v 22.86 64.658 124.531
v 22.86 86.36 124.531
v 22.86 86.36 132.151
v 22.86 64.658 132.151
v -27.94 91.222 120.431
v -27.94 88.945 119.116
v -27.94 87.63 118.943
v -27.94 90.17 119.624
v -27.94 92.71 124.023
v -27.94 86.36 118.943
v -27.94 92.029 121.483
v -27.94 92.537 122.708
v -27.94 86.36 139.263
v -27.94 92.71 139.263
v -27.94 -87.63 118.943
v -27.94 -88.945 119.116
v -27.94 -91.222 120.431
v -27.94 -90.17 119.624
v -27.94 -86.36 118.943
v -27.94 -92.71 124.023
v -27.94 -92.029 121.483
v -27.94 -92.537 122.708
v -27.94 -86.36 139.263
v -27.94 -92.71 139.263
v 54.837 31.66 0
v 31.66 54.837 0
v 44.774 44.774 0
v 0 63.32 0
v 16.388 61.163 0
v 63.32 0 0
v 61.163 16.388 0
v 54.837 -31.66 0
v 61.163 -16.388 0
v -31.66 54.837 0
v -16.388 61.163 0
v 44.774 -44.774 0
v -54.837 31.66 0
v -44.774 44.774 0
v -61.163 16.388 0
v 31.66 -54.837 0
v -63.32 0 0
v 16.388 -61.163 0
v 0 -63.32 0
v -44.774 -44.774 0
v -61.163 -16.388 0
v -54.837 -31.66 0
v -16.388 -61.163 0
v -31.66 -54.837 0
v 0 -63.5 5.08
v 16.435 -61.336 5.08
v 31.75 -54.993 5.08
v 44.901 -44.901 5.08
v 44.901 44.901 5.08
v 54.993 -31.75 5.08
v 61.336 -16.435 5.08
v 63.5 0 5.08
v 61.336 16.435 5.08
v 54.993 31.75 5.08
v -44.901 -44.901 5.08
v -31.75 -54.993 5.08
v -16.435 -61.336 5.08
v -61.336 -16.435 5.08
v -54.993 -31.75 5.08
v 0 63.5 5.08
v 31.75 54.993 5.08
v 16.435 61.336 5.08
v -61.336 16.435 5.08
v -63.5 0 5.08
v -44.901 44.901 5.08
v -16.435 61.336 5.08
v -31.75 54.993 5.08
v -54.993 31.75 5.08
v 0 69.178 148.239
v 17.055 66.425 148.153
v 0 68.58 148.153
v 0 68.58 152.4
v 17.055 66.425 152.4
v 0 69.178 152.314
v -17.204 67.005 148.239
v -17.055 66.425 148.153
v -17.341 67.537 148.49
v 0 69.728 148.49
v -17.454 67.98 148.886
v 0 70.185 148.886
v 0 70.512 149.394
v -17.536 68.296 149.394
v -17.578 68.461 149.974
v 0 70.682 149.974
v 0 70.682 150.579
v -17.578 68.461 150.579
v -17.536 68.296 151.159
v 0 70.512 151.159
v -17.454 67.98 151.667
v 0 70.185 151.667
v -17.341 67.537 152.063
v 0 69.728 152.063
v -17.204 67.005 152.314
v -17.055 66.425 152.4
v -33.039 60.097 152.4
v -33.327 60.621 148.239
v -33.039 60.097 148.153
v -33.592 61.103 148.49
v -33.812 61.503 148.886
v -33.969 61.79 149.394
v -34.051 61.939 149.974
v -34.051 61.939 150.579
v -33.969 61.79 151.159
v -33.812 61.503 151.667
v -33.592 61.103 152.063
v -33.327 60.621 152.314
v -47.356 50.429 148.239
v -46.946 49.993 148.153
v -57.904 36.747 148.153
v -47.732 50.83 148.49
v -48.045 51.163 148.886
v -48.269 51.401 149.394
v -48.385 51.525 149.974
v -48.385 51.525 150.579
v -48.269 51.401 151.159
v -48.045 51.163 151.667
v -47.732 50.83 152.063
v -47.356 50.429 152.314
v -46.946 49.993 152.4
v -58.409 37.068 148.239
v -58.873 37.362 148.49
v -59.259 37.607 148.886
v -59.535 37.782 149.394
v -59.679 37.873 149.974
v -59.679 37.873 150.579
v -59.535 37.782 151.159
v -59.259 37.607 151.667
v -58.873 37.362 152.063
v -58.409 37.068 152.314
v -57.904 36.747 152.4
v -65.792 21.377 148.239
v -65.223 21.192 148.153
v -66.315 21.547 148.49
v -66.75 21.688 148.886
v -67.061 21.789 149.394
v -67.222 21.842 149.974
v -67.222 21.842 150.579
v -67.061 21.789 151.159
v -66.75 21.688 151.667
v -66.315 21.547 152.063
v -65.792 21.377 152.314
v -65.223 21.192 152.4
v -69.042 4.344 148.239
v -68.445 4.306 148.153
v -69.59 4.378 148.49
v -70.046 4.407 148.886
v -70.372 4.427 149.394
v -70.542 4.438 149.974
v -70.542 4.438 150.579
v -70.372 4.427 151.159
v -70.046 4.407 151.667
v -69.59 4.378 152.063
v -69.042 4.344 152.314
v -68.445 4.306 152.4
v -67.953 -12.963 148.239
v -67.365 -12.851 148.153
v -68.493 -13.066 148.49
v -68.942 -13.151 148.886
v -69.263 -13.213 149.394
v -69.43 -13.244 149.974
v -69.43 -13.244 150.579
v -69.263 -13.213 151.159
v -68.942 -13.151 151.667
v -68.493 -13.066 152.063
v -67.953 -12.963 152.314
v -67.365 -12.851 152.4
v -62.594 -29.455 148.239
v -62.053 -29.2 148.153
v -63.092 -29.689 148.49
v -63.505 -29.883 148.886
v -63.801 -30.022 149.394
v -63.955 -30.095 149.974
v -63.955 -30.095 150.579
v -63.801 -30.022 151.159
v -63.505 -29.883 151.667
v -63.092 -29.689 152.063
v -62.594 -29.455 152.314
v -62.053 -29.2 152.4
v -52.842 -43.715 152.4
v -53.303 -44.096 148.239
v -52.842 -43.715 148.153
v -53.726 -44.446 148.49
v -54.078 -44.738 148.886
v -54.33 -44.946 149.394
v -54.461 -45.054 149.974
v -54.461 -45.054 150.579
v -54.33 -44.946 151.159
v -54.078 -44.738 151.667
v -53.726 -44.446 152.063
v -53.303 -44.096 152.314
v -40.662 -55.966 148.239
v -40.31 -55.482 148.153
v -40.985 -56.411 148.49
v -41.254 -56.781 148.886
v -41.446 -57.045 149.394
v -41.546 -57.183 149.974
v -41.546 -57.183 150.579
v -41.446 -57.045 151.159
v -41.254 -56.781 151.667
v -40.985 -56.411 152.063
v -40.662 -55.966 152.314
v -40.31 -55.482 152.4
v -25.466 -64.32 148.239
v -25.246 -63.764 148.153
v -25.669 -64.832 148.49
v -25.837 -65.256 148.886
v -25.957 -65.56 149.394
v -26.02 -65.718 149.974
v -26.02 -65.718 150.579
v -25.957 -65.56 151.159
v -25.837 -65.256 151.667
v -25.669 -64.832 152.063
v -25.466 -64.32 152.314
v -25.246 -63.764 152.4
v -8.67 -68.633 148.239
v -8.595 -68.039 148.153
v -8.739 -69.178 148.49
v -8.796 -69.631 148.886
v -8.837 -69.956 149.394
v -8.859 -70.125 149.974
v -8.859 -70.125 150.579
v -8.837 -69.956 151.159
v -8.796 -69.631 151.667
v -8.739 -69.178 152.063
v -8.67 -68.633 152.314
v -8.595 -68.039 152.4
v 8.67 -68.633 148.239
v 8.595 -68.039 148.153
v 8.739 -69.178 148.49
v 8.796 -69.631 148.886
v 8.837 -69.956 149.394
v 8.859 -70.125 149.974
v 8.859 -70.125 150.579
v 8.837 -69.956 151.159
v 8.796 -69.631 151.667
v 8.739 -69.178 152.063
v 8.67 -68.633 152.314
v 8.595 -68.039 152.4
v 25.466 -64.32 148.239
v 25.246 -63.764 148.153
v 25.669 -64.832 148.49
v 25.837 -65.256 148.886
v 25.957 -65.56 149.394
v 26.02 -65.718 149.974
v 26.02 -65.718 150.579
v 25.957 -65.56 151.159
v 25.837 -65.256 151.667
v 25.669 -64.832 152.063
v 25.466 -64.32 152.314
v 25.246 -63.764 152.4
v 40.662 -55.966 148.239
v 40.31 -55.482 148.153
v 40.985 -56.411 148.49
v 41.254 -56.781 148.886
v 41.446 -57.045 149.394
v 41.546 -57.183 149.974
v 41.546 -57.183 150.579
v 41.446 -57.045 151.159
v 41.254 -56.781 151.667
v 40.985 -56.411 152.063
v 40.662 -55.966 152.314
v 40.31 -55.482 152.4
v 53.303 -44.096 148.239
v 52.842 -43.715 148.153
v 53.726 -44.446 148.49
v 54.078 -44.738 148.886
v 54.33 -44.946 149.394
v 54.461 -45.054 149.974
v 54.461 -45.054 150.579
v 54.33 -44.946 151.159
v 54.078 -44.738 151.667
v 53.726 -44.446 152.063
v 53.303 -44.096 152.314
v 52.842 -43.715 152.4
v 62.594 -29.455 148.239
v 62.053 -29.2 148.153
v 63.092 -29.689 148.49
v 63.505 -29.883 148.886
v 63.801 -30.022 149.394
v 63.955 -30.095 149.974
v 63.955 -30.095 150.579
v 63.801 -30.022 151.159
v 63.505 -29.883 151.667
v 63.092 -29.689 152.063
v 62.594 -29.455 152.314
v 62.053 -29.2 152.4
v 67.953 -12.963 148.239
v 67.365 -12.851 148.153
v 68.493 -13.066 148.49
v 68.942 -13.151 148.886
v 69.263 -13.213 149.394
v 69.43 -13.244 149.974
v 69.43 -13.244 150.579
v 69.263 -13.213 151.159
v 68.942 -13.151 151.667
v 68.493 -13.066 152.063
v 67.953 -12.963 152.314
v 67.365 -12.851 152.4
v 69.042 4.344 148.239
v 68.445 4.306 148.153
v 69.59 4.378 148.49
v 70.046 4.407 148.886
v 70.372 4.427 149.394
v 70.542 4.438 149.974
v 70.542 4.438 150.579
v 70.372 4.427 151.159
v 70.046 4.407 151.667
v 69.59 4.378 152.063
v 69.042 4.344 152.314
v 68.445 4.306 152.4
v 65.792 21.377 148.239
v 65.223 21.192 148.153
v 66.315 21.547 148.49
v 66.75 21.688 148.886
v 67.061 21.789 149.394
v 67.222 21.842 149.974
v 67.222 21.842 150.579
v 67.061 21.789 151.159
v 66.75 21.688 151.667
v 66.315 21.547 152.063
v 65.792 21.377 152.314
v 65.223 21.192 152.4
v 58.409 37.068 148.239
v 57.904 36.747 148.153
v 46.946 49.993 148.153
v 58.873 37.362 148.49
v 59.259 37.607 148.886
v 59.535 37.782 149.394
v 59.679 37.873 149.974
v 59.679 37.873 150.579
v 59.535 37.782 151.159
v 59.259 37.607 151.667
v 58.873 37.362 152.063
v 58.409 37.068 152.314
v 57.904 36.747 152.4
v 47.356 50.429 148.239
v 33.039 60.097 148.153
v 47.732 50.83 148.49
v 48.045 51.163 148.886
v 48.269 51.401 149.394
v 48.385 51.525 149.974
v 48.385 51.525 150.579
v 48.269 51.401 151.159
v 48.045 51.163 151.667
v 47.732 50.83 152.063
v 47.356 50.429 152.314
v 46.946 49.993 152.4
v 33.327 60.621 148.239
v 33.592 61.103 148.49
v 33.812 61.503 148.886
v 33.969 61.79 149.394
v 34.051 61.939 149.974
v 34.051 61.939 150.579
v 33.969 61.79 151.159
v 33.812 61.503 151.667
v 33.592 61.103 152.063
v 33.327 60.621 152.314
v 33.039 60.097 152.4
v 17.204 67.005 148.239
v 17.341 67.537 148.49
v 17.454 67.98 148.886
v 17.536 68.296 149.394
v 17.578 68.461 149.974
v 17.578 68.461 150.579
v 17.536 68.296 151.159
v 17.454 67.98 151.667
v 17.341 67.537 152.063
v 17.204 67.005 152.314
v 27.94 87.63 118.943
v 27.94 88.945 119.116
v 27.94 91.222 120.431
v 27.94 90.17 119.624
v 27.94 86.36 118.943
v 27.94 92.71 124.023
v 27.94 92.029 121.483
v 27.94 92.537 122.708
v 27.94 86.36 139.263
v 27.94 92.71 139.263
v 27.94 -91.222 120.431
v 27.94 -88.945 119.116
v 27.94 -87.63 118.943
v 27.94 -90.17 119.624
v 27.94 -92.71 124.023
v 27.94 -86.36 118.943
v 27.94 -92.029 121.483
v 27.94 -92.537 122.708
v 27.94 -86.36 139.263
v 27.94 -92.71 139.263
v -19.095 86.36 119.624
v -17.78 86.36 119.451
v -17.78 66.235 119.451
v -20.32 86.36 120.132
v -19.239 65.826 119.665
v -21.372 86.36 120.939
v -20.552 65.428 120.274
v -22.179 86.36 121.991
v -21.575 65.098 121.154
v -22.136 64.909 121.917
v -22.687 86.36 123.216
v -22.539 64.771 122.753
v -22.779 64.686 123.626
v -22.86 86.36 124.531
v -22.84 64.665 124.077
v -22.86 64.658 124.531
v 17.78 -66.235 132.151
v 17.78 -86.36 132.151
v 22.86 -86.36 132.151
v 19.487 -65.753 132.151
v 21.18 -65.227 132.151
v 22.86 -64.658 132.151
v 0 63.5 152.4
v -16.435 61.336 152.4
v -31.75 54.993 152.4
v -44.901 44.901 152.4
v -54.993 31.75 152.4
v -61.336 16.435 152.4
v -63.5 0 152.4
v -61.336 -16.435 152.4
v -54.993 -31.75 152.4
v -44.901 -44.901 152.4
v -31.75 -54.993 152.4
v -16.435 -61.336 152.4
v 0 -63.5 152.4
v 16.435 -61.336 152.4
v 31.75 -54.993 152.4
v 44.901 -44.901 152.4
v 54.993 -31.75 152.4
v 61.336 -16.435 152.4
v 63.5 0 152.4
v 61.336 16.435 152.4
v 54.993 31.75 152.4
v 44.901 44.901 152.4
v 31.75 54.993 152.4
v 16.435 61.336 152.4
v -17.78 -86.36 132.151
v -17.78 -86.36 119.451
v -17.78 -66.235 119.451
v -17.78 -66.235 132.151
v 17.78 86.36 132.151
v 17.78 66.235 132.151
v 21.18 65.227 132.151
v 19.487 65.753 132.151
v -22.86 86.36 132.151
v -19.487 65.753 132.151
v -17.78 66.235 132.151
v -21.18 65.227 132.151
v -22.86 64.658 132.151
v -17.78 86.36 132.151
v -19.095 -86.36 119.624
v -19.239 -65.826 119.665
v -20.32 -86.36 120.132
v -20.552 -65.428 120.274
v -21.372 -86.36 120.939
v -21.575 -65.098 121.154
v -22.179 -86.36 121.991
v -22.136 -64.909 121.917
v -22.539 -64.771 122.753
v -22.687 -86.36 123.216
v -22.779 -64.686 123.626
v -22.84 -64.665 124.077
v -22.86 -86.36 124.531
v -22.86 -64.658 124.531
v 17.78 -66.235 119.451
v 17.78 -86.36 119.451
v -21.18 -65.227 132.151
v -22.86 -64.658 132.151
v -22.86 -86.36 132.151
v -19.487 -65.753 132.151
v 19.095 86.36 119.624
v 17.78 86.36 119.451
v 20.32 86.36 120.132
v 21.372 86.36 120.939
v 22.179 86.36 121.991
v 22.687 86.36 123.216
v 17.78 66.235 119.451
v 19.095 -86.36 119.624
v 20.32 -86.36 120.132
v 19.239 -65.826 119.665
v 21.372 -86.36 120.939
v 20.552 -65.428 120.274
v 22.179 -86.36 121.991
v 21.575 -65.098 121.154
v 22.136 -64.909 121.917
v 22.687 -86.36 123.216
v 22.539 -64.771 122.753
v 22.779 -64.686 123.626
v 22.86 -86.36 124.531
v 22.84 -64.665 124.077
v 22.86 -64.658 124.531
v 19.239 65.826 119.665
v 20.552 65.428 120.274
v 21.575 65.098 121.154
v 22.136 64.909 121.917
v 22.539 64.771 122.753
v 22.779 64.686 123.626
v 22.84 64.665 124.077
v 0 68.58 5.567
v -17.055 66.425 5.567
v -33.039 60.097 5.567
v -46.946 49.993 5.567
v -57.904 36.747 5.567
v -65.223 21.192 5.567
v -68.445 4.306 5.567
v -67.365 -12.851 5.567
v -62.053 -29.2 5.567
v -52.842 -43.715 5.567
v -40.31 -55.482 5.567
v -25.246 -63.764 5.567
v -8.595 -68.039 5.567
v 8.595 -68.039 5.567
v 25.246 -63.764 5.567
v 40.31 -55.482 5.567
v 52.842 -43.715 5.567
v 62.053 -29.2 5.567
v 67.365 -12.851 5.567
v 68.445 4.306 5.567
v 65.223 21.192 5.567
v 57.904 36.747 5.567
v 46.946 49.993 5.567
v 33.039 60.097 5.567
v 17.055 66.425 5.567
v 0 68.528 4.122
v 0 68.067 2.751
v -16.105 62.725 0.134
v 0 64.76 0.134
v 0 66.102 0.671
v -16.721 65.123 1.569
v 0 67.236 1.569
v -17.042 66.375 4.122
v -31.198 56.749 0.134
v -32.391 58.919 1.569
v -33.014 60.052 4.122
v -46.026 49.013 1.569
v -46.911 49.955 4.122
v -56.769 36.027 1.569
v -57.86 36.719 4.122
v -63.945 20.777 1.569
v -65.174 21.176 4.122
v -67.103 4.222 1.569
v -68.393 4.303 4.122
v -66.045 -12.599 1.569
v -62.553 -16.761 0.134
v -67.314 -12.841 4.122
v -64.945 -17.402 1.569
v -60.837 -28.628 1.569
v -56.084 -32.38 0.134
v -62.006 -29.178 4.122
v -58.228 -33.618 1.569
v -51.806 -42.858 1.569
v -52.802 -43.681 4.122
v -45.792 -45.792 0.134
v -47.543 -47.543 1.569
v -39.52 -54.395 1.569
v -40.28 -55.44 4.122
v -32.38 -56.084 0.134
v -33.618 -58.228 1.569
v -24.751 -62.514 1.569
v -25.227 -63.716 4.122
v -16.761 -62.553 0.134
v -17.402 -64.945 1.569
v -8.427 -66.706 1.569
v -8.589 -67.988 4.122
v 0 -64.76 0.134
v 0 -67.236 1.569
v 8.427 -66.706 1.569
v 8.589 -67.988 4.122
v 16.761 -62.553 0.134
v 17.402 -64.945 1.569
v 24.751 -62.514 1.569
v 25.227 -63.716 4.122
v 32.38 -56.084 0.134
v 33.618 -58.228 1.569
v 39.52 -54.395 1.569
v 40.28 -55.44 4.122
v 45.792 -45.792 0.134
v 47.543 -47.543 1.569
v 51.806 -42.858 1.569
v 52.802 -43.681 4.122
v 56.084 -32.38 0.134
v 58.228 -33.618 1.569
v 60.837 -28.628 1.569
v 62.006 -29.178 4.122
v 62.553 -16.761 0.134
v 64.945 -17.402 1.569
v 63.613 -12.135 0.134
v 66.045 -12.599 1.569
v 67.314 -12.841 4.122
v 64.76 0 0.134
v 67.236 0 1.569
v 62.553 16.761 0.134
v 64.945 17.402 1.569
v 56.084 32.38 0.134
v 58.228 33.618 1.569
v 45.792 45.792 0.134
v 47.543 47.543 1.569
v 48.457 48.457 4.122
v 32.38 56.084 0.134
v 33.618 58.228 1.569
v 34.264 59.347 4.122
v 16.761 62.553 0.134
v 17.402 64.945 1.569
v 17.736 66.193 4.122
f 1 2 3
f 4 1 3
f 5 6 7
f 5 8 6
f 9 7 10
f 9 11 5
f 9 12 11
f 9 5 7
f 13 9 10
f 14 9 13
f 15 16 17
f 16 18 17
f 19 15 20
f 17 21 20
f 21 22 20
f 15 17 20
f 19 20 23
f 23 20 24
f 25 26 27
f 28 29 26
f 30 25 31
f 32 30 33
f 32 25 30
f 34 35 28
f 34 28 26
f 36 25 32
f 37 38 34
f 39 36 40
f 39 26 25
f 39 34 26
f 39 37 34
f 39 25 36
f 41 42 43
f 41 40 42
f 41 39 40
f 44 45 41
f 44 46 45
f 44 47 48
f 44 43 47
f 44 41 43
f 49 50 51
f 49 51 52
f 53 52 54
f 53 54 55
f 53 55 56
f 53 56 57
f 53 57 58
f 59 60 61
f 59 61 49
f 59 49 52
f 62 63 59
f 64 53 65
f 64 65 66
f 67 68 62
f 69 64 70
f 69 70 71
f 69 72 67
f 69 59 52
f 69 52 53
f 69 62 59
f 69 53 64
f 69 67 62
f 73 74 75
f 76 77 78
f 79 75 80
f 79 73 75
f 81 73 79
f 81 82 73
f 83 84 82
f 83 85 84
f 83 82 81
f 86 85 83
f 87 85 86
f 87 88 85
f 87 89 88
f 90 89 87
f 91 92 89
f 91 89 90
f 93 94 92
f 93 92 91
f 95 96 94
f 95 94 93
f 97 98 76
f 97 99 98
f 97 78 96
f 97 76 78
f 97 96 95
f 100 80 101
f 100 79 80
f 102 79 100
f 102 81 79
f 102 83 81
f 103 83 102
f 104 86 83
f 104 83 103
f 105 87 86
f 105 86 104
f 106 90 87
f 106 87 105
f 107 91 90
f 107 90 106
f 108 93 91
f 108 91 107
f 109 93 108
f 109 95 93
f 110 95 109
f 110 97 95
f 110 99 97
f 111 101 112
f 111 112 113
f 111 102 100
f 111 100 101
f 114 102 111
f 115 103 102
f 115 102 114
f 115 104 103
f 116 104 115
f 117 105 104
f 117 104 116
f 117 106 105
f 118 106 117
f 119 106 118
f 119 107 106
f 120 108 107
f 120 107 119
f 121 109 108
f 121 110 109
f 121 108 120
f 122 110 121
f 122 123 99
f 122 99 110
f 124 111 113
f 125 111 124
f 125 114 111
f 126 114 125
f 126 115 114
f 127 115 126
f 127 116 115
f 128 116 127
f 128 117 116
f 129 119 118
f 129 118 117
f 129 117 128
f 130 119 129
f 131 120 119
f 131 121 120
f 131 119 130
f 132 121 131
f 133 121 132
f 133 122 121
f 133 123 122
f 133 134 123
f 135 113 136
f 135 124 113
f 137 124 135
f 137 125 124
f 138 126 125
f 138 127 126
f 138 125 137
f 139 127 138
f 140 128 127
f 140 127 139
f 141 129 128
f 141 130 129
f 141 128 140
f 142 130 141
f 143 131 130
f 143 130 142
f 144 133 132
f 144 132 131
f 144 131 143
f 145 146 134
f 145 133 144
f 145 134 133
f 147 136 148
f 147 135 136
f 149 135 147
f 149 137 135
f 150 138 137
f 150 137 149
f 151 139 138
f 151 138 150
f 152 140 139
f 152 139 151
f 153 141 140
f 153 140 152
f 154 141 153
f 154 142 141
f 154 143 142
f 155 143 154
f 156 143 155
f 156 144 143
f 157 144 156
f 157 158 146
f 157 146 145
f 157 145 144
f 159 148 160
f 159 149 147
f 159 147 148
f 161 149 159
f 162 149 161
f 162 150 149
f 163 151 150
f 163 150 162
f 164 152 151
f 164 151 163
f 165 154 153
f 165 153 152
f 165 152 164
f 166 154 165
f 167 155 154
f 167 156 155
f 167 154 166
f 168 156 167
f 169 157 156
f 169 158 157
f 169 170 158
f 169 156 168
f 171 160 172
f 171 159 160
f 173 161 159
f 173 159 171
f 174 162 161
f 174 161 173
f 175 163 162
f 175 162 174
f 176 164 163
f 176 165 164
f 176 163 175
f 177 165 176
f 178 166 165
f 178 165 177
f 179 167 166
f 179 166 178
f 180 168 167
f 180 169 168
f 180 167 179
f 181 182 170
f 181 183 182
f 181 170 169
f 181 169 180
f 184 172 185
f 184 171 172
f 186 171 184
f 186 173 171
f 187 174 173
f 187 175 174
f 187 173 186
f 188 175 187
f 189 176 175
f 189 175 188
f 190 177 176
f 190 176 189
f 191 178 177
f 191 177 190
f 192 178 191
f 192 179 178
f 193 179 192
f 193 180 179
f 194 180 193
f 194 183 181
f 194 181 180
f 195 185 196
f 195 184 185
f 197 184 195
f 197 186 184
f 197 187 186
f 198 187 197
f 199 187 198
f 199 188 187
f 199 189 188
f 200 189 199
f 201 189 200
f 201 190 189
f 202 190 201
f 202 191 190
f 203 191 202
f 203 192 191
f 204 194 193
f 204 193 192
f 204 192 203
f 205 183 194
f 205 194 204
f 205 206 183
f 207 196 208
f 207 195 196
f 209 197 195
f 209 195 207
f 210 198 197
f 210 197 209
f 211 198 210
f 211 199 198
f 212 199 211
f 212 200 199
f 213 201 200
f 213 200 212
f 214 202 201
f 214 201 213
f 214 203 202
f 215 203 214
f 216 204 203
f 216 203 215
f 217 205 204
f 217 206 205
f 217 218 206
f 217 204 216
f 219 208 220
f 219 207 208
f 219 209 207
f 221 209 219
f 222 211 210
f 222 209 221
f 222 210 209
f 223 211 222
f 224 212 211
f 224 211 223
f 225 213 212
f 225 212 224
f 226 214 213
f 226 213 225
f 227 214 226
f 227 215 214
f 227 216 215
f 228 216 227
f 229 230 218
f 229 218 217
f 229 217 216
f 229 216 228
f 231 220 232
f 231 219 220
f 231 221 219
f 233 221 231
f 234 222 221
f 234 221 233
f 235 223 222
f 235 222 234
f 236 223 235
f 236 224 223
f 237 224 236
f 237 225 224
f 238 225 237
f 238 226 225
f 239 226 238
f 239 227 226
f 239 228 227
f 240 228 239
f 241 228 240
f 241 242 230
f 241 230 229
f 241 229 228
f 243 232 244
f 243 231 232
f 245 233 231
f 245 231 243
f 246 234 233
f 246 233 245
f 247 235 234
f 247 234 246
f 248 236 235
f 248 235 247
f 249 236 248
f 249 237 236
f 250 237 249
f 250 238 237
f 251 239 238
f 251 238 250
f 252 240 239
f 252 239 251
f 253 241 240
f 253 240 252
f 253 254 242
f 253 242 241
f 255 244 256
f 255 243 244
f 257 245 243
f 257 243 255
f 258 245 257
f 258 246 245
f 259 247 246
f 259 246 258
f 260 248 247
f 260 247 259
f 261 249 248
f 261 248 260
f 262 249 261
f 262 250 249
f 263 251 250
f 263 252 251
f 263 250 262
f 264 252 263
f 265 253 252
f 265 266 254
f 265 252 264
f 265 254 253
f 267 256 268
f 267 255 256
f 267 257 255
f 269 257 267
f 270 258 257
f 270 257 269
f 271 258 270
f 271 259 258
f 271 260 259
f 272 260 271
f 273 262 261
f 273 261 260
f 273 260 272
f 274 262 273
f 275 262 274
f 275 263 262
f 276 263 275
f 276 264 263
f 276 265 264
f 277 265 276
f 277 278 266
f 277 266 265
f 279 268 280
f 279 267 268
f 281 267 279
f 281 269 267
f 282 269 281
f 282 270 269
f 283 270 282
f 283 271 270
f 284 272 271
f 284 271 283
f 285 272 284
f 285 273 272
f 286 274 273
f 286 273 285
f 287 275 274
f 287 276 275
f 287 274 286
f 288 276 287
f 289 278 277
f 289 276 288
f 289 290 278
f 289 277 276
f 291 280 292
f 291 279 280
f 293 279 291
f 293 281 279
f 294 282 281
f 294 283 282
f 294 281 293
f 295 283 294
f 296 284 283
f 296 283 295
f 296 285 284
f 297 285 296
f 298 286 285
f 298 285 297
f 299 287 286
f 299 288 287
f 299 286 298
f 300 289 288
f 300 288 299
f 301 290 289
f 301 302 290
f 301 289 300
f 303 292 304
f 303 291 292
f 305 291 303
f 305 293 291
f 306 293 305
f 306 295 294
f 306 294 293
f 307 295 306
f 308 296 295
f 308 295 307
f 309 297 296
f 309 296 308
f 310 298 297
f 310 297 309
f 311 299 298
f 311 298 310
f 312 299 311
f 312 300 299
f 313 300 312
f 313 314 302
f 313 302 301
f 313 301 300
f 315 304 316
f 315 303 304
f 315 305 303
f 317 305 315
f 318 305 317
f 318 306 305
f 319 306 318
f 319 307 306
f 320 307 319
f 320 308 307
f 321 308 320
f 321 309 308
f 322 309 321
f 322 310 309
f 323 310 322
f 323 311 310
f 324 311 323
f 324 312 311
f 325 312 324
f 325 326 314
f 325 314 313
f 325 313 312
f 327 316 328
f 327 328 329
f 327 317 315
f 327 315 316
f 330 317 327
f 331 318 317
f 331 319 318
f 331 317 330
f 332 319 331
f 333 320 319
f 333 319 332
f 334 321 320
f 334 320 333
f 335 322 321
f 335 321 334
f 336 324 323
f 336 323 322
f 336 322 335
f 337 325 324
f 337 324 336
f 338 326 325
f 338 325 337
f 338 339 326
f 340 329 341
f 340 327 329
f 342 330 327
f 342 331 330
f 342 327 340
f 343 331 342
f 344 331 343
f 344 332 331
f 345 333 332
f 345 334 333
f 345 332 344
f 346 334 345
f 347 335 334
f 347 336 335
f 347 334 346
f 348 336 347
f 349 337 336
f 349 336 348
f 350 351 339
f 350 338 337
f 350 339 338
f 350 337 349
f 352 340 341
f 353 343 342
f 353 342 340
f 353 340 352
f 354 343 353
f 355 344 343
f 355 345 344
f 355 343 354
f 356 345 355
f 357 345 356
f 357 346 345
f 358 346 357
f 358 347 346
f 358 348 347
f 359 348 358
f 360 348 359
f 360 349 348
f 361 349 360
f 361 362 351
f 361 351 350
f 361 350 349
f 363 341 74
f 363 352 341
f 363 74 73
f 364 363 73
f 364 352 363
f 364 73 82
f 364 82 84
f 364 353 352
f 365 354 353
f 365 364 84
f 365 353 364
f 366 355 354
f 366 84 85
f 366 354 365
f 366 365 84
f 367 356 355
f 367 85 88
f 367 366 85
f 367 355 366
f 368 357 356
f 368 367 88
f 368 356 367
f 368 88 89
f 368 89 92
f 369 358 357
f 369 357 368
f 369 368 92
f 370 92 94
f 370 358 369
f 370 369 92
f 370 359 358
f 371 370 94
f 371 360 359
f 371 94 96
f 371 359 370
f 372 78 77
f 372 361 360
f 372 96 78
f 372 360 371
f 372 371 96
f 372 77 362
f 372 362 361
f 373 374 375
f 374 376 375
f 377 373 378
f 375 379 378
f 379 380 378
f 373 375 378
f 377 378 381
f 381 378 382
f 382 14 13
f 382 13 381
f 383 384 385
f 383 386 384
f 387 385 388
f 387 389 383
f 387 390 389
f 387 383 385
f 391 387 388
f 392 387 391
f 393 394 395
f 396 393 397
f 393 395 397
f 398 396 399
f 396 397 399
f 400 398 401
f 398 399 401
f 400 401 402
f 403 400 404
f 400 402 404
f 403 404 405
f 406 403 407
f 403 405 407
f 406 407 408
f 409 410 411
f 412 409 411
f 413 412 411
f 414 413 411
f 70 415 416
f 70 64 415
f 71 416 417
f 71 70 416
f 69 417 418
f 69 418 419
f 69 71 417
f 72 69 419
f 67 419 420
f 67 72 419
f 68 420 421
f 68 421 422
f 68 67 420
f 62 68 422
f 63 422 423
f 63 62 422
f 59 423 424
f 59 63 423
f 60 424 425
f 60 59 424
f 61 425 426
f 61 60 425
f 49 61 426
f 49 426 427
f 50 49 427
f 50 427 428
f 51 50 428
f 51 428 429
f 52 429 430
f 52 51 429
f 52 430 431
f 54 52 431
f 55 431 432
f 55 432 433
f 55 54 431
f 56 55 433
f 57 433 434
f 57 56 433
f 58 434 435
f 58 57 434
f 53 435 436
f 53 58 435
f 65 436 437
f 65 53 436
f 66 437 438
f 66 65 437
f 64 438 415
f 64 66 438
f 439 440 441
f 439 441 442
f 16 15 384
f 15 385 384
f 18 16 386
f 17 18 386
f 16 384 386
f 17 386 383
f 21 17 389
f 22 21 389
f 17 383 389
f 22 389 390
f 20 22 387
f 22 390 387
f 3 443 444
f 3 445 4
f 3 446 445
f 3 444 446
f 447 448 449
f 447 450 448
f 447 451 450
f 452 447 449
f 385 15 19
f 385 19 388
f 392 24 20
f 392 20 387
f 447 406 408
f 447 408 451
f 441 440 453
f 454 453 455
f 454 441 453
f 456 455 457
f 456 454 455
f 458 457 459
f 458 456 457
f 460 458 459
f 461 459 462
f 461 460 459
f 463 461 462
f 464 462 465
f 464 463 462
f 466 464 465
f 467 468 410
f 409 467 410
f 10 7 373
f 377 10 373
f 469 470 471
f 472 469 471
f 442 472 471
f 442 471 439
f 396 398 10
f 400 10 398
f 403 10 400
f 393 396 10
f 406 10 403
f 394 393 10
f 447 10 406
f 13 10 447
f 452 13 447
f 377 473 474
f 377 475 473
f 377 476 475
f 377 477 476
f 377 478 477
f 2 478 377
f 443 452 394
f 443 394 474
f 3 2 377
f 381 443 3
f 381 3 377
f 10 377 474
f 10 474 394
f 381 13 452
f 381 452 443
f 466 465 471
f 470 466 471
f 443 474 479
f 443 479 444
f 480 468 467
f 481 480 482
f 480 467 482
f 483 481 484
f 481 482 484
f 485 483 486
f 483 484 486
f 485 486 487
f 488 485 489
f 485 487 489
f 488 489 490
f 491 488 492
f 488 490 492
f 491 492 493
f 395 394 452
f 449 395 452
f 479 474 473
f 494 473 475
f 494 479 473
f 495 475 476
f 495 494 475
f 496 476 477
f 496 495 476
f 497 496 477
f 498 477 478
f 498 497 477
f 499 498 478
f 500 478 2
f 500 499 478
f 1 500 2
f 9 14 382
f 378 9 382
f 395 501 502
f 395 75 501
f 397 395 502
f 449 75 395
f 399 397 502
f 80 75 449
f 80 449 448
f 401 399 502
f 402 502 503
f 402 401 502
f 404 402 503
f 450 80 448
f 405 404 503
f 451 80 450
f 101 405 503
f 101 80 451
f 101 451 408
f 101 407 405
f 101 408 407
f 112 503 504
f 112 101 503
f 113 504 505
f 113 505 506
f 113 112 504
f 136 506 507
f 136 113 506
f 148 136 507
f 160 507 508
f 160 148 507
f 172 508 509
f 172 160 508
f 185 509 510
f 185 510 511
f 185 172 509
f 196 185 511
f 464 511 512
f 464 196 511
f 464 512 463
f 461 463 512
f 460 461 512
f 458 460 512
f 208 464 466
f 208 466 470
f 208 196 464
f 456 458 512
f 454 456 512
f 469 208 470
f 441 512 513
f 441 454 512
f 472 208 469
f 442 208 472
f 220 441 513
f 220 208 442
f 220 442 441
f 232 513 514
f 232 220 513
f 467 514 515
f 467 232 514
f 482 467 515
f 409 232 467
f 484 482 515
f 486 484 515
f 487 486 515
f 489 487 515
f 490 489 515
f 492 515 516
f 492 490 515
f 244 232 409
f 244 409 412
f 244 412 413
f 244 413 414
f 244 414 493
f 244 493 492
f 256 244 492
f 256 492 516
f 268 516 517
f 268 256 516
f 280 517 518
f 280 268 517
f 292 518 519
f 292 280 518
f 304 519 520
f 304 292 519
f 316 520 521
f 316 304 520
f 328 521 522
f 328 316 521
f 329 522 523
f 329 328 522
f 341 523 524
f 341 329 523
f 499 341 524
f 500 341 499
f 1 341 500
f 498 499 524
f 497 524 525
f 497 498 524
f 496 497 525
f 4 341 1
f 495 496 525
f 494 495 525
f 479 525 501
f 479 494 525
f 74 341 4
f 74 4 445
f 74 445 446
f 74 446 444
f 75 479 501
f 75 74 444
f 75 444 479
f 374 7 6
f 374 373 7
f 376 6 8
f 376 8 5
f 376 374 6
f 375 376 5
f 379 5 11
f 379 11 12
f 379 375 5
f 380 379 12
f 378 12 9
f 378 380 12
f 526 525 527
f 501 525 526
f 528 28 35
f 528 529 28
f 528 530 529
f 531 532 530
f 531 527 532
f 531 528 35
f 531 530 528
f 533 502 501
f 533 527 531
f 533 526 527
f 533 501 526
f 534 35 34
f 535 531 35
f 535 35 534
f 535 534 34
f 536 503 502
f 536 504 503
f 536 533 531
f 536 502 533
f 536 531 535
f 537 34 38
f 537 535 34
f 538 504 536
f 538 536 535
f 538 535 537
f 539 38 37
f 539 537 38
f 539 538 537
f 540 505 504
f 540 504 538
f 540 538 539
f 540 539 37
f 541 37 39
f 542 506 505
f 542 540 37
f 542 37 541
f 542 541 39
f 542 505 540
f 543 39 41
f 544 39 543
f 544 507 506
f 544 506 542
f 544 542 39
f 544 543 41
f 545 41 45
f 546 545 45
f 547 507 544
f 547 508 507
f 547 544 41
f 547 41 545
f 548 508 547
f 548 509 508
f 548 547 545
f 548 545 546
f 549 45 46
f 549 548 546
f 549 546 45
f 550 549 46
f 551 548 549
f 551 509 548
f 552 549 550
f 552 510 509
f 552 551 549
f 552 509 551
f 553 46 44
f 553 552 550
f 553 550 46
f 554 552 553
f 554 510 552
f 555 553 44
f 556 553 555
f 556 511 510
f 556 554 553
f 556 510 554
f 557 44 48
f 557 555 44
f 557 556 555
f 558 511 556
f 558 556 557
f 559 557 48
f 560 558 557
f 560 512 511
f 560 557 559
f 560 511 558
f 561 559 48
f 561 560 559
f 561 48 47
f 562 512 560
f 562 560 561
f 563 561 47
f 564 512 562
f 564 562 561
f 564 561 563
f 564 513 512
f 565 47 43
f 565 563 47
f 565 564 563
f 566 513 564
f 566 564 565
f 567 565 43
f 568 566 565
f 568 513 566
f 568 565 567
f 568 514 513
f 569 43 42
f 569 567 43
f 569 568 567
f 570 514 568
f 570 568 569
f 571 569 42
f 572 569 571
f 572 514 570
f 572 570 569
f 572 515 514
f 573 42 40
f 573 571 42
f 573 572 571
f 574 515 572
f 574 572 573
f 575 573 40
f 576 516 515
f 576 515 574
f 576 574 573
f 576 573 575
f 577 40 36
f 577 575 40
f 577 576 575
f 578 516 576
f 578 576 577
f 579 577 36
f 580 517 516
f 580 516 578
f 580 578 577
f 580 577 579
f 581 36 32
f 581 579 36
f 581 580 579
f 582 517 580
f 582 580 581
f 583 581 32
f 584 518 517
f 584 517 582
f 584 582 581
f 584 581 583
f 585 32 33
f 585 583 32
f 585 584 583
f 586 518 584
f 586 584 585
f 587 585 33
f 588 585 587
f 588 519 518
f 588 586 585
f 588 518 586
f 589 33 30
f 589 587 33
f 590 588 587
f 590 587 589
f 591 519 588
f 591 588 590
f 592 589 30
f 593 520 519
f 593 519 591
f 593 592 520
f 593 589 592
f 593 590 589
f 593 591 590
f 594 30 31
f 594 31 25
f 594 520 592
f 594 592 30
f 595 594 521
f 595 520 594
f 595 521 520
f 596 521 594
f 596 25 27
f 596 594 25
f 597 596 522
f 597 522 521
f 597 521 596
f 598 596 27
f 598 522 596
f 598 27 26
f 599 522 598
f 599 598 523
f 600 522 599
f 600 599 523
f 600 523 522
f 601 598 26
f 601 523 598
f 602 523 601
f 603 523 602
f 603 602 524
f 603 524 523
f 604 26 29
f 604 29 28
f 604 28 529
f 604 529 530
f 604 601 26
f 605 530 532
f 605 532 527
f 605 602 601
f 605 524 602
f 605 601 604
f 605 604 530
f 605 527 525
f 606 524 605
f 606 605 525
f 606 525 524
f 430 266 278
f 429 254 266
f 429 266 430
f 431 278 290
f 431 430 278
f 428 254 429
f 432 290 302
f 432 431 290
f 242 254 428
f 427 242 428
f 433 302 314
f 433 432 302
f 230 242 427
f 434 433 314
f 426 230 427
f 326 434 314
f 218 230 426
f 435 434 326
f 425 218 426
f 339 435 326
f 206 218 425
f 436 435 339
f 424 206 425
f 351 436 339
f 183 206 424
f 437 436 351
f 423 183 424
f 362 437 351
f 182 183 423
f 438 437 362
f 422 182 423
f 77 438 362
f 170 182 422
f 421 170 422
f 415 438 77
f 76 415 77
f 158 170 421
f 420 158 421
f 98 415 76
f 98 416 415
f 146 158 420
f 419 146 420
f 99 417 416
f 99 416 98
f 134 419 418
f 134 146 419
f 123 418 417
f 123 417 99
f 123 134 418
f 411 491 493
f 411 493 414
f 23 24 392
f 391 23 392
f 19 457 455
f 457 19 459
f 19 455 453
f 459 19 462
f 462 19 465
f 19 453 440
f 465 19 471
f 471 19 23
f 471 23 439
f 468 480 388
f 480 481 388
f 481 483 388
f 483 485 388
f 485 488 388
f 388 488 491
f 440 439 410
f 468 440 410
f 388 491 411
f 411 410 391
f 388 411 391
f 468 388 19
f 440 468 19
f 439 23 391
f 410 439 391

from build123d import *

# Parameters (mm, degrees)
F3_W      = 5.08
F3_H      = 12.7
F6_W      = 55.88
F6_H      = 20.32
F7_DEPTH  = 6.35
F10_W     = 5.08
F10_H     = 12.7
F12_W     = 55.88
F12_H     = 20.32
F13_DEPTH = 6.35
F14_R     = 5.08
F15_R     = 5.08
F16_R     = 5.07999


# Not quite as in the source:
# - a fillet or chamfer is up to 0.001 mm smaller than in the source, because OpenCascade refuses the exact size


with BuildPart() as f1:
    # F0 (on Right) → F1 (revolve)
    with BuildSketch(Plane.YZ):
        with BuildLine():
            Line((63.5, 5.08), (0, 5.08))
            Line((0, 5.08), (0, 0))
            Line((0, 0), (63.3201003075, 0))
            ThreePointArc((63.3201003075, 0), (67.2357467781, 1.5686265864), (68.58, 5.5668586865))
            Line((68.58, 5.5668586865), (68.58, 148.1529325247))
            ThreePointArc((68.58, 148.1529325247), (70.7035337377, 150.2764662623), (68.58, 152.4))
            Line((68.58, 152.4), (63.5, 152.4))
            Line((63.5, 152.4), (63.5, 5.08))
        make_face()
    revolve(axis=Axis((0, 0, 2.54), (0, 0, 1)))

    # F3 (on offset) → F4 (join, up to the next surface of F1)
    with BuildSketch(Plane.XZ.offset(86.36)):
        with Locations((-20.32, 125.8009325247)):
            Rectangle(F3_W, F3_H)
        with Locations((20.32, 125.8009325247)):
            Rectangle(F3_W, F3_H)
    extrude(until=Until.NEXT, dir=(0, 1, 0))

    # F6 (on offset) → F7 (join, through all)
    with BuildSketch(Plane.XZ.offset(92.71)):
        with Locations((0, 129.1029325247)):
            Rectangle(F6_W, F6_H)
    extrude(amount=-F7_DEPTH)

    # F10 (on offset) → F11 (join, up to the next surface of F1)
    with BuildSketch(Plane.XZ.offset(-86.36)):
        with Locations((20.32, 125.8009325247)):
            Rectangle(F10_W, F10_H)
        with Locations((-20.32, 125.8009325247)):
            Rectangle(F10_W, F10_H)
    extrude(until=Until.NEXT)

    # F12 (on offset) → F13 (join, through all)
    with BuildSketch(Plane.XZ.offset(-92.71)):
        with Locations((0, 129.1029325247)):
            Rectangle(F12_W, F12_H)
    extrude(amount=F13_DEPTH)

    # F14
    f14_edges = [f1.edges().sort_by_distance(p)[0] for p in [
        (0, -92.71, 118.942933),
    ]]
    fillet(f14_edges, radius=F14_R)

    # F15
    f15_edges = [f1.edges().sort_by_distance(p)[0] for p in [
        (0, 92.71, 118.942933),
    ]]
    fillet(f15_edges, radius=F15_R)

    # F16 (radius 5.08 in the source; OpenCascade refuses exactly that, so slightly less here)
    f16_edges = [f1.edges().sort_by_distance(p)[0] for p in [
        (-22.86, 75.508922, 119.450933),
        (22.86, 75.508922, 119.450933),
        (-22.86, -75.508922, 119.450933),
        (22.86, -75.508922, 119.450933),
    ]]
    fillet(f16_edges, radius=F16_R)


solid = f1.part
